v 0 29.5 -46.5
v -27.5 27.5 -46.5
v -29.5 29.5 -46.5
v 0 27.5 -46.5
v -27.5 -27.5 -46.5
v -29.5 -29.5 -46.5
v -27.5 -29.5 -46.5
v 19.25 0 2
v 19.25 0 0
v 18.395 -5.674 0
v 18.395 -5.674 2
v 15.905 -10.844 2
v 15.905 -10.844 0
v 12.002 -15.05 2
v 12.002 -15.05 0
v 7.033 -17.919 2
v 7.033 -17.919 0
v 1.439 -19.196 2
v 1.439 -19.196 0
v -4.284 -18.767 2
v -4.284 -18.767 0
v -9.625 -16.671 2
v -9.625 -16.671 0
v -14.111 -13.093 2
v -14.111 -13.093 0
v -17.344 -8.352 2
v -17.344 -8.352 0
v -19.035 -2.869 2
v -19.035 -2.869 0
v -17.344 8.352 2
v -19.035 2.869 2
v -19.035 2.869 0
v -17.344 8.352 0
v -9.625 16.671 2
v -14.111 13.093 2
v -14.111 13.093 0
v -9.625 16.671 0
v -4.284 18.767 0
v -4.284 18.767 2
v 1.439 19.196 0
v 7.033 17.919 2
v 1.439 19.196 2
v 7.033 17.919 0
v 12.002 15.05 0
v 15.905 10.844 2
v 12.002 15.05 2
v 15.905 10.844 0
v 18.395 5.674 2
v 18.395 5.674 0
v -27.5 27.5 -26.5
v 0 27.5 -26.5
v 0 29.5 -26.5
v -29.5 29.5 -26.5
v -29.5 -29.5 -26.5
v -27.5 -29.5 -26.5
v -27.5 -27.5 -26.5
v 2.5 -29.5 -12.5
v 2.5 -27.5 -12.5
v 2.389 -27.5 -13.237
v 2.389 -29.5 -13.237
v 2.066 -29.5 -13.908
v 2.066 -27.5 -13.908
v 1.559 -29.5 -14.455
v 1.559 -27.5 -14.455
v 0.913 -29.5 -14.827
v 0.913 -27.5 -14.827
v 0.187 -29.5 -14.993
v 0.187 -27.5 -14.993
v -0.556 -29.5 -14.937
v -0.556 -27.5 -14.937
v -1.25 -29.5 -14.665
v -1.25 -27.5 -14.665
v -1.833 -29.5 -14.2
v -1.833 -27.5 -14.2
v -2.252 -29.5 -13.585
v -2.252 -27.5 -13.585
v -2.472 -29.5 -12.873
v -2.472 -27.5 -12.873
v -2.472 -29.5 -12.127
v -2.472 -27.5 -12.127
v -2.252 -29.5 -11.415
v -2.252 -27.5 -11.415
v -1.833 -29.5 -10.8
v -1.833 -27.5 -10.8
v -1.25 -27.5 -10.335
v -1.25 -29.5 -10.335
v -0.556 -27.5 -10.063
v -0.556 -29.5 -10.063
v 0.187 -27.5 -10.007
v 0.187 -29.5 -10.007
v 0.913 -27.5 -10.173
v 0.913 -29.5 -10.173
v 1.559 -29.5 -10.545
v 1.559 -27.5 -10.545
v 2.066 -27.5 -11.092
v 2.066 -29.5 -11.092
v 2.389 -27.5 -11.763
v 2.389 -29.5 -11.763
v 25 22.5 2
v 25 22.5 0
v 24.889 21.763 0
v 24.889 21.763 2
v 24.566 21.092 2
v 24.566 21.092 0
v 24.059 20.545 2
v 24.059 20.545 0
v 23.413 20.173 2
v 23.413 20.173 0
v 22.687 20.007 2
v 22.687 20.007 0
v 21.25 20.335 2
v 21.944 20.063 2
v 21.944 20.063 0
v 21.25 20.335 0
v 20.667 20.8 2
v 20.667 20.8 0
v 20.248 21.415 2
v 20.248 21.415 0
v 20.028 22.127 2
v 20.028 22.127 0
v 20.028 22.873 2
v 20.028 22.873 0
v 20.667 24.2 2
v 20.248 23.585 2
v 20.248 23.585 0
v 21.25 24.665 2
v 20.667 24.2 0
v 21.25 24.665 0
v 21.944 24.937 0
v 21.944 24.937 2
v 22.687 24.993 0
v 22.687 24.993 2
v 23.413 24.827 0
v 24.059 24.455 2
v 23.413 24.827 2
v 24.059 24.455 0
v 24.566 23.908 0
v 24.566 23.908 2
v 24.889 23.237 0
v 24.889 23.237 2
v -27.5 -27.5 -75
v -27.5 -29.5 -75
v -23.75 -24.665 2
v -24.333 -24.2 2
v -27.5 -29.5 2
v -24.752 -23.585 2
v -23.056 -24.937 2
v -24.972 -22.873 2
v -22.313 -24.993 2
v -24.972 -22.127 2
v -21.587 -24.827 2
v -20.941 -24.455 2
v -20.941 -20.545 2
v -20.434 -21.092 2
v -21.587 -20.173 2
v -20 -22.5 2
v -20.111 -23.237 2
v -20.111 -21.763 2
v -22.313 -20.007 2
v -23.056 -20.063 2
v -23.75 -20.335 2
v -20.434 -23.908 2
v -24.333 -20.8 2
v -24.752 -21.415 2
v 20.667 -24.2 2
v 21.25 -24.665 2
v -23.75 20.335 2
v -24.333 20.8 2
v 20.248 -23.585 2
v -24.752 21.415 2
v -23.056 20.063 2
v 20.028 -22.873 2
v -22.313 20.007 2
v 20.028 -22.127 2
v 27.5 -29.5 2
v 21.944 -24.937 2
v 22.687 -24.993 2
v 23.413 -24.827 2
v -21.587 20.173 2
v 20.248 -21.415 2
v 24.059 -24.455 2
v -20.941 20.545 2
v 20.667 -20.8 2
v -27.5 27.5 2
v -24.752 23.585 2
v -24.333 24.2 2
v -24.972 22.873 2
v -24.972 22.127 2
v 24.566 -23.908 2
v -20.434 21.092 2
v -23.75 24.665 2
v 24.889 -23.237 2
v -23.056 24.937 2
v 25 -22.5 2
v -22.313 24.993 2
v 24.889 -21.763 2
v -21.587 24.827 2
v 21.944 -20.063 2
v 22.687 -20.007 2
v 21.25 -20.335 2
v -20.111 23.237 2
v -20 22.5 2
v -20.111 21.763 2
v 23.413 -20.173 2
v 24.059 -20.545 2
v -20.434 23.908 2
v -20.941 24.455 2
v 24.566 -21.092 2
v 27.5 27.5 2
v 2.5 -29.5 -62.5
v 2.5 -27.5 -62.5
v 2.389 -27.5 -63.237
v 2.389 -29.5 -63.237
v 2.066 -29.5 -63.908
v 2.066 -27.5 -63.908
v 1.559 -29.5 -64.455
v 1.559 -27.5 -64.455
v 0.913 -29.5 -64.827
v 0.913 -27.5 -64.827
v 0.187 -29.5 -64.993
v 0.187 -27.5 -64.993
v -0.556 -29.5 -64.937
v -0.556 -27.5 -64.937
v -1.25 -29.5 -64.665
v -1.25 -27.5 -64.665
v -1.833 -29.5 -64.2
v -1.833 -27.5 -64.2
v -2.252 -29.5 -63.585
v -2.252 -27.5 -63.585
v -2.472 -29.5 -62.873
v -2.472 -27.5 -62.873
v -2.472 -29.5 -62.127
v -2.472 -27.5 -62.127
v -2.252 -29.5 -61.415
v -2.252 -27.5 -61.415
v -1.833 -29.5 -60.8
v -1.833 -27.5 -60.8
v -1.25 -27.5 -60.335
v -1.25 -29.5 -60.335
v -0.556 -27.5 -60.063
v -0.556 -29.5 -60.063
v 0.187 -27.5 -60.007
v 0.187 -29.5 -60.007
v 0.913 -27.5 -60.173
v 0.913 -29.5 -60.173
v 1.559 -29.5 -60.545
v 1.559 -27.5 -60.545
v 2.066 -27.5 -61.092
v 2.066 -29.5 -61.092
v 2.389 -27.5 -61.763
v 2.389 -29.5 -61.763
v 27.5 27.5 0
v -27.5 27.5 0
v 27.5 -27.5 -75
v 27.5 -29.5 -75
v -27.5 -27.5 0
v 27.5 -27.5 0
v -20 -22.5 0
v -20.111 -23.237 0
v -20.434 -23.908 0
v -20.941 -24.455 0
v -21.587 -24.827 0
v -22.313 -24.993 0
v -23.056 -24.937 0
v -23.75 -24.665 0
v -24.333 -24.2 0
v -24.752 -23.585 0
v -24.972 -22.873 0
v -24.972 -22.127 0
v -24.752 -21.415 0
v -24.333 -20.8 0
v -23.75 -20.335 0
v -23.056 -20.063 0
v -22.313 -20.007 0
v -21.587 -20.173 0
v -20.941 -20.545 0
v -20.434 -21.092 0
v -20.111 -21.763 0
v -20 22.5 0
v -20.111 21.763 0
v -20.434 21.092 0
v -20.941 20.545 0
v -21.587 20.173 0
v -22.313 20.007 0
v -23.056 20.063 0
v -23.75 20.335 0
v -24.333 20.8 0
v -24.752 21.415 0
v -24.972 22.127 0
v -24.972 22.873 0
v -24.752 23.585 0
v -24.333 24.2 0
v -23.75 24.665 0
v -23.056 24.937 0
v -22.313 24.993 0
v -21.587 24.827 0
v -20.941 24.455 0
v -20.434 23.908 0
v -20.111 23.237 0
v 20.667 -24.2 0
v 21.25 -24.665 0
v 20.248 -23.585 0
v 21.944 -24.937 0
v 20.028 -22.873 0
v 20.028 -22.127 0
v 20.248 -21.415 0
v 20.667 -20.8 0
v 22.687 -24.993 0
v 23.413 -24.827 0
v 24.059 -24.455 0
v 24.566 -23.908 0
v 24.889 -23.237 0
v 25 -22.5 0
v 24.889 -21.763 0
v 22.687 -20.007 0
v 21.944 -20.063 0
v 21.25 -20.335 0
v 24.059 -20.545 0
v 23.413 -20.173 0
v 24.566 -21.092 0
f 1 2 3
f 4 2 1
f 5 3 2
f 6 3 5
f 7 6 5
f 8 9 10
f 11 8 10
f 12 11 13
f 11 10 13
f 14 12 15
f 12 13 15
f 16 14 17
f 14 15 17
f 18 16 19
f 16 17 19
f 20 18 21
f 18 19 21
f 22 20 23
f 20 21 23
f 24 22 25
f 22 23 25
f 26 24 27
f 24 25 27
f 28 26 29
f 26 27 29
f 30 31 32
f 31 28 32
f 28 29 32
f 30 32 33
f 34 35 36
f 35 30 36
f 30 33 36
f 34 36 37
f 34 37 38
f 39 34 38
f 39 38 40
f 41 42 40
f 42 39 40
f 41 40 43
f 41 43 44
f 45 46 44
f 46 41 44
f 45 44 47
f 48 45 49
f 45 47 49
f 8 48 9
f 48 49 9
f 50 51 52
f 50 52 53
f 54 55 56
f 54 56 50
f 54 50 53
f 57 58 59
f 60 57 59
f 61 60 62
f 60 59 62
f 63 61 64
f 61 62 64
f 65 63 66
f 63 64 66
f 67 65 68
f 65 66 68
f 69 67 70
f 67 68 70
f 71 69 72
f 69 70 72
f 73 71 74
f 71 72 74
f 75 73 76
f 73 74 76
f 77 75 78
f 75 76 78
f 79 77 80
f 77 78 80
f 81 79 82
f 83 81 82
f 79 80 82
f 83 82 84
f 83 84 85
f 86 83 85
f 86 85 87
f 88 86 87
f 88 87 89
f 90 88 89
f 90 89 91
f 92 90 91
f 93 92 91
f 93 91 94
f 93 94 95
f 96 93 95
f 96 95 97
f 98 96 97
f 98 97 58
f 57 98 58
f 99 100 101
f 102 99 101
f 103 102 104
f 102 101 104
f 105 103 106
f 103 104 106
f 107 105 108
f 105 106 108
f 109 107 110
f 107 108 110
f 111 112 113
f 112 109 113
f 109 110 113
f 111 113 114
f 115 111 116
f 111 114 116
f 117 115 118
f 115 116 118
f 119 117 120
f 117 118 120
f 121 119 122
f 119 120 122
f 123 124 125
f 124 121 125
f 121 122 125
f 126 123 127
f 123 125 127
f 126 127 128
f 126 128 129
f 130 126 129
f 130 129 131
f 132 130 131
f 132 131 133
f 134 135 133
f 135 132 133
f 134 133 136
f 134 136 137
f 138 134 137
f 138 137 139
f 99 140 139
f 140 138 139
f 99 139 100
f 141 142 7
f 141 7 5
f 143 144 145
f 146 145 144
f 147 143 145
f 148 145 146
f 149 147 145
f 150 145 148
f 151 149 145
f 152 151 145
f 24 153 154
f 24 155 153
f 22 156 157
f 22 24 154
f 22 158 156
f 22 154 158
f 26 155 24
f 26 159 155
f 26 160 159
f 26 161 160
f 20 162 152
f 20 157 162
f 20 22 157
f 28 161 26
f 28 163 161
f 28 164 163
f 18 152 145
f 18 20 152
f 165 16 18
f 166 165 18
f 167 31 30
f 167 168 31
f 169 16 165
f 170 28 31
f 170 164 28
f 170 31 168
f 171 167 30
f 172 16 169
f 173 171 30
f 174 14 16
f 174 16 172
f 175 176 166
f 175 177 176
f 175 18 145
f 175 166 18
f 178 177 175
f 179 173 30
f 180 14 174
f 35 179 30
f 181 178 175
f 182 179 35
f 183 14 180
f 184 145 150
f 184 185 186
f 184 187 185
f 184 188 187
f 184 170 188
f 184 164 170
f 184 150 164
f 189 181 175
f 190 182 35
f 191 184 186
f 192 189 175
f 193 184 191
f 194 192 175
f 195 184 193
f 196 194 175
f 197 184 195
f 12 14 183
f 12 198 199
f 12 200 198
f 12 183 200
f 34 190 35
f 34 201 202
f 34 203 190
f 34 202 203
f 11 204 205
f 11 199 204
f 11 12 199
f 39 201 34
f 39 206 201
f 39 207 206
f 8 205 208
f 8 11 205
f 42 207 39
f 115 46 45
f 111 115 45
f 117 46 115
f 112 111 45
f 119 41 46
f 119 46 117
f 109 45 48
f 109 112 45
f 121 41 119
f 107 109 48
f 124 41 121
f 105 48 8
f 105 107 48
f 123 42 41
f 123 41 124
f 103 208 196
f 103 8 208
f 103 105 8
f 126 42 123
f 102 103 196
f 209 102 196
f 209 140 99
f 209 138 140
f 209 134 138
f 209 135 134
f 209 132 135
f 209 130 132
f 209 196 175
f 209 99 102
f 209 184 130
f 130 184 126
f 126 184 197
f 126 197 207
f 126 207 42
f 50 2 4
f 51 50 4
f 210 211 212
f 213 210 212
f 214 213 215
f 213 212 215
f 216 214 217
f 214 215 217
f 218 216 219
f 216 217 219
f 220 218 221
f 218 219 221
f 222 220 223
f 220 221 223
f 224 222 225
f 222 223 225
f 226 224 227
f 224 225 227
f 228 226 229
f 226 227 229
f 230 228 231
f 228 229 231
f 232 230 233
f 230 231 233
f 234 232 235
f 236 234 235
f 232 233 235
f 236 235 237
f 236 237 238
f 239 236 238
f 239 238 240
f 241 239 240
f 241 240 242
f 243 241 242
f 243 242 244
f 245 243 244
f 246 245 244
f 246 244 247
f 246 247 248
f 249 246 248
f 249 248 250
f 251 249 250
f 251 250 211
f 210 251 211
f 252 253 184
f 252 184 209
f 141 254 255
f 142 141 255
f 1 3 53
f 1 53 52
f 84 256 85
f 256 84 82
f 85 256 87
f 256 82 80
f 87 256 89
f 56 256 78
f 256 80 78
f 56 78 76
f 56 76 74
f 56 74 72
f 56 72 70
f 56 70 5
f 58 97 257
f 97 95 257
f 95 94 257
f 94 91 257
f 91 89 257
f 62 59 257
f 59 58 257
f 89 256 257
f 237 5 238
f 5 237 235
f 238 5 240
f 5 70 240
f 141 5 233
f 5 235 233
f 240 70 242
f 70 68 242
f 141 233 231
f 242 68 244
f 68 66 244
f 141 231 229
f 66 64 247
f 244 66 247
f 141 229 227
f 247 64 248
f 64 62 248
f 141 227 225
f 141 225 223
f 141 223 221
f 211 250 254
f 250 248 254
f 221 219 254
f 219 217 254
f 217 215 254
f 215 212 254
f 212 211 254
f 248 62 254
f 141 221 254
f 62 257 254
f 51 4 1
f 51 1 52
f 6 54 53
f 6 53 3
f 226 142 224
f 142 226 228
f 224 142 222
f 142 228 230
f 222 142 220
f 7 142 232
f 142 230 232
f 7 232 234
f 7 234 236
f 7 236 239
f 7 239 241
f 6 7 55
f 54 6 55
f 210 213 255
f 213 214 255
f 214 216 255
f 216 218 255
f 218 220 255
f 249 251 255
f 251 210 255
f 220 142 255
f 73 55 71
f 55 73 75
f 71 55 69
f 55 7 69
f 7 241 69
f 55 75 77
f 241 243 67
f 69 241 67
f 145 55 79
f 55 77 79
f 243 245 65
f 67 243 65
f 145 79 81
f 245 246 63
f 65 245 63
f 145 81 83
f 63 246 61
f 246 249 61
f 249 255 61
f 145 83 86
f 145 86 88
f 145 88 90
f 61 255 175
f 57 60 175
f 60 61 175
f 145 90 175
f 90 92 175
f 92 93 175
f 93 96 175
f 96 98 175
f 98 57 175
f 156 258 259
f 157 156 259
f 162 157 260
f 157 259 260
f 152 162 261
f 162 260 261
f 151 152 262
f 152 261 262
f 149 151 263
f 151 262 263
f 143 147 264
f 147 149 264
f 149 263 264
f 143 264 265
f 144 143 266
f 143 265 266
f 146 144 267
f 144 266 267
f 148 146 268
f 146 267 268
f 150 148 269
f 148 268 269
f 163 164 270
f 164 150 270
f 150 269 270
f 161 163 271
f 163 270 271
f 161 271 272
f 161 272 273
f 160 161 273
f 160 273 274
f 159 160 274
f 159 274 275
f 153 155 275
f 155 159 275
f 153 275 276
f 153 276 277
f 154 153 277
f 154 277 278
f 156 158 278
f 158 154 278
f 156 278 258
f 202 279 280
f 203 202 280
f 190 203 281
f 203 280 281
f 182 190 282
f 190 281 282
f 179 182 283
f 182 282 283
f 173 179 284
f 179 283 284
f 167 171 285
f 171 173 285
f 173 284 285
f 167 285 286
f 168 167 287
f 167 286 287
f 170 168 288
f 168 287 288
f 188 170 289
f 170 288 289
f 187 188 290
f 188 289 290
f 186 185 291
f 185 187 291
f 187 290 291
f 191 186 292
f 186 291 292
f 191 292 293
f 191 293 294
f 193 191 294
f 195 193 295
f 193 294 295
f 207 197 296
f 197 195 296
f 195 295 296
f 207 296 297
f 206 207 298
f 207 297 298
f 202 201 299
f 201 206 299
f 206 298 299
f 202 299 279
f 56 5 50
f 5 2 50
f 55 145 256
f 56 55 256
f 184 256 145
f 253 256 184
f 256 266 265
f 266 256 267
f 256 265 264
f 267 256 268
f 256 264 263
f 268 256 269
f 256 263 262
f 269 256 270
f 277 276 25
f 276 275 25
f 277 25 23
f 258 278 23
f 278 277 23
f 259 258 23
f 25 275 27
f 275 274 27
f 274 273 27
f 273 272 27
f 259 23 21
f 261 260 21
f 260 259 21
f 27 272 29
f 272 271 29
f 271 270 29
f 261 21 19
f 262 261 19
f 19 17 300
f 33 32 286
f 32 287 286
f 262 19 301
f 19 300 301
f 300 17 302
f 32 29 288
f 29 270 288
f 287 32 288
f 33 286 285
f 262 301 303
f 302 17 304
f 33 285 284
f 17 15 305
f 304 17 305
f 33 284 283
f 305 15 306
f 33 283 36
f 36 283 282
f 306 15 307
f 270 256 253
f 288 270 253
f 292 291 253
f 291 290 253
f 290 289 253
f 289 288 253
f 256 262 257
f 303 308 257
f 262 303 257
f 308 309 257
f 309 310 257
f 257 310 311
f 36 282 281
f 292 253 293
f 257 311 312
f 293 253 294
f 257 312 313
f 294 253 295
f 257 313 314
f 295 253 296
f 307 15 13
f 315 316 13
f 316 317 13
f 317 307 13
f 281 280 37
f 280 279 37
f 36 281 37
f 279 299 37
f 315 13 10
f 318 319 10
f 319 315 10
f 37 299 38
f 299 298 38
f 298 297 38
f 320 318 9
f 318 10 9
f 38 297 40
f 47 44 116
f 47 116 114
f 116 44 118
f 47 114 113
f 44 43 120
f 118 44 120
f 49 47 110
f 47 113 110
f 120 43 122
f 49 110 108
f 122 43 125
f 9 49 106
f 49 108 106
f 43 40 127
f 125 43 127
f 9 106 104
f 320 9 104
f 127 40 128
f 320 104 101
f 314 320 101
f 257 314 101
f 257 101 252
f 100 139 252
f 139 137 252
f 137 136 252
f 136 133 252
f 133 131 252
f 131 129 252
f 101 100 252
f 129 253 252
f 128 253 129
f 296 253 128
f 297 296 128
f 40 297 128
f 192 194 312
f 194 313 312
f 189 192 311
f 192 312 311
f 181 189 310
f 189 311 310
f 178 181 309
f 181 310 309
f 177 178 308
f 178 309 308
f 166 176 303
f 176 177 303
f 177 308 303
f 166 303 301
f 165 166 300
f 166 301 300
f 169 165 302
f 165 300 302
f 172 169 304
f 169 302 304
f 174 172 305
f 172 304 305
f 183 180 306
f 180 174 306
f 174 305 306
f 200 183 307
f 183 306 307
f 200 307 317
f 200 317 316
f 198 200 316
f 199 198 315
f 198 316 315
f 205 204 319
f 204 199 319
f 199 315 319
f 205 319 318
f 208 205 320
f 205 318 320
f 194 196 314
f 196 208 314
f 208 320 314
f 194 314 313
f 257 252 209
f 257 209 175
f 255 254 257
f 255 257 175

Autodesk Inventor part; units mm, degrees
ref_plane "YZ Plane" through (0, 0, 0) normal (1, 0, 0) x (0, 1, 0)
ref_plane "XZ Plane" through (0, 0, 0) normal (0, 1, 0) x (-1, 0, 0)
ref_plane "XY Plane" through (0, 0, 0) normal (0, 0, 1) x (1, 0, 0)
sketch "Sketch1" plane through (0, 0, 0) normal (0, 0, 1) x (1, 0, 0)
  line L0 (-27.5, 27.5) -> (27.5, 27.5)
  line L1 (27.5, 27.5) -> (27.5, -27.5)
  line L2 (27.5, -27.5) -> (-27.5, -27.5)
  line L3 (-27.5, -27.5) -> (-27.5, 27.5)
  circle A0 centre (-22.5, 22.5) radius 2.5
  circle A1 centre (22.5, 22.5) radius 2.5
  circle A2 centre (-22.5, -22.5) radius 2.5
  circle A3 centre (22.5, -22.5) radius 2.5
  circle A4 centre (0, 0) radius 19.25
  dimension "d1" = 55
  dimension "d2" = 55
  dimension "d3" = 27.5
  dimension "d4" = 27.5
  dimension "d5" = 38.5
  dimension "d6" = 5
  dimension "d7" = 5
  dimension "d8" = 5
  dimension "d9" = 5
  dimension "d10" = 5
  dimension "d11" = 5
  dimension "d12" = 5
  dimension "d13" = 5
  dimension "d14" = 5
  dimension "d15" = 5
  dimension "d16" = 5
  dimension "d17" = 5
extrude "Extrusion1" add sketch "Sketch1" along normal blind 2
sketch "Sketch2" plane through (27.5, -27.5, 0) normal (1, 0, 0) x (0, 0, -1)
  line L0 (0, 0) -> (-2, 0) projected
  line L1 (0, 0) -> (75, 0)
  line L2 (75, 0) -> (75, -2)
  line L3 (75, -2) -> (-2, -2)
  line L4 (-2, -2) -> (-2, 0)
  point P0 (0, 27.5)
  dimension "d20" = 75
  dimension "d21" = 2
  dimension "d22" = 77
extrude "Extrusion2" add sketch "Sketch2" against normal blind 55
sketch "Sketch3" plane through (-27.5, -27.5, 0) normal (-1, 0, 0) x (0, 0, 1)
  line L0 (-75, -2) -> (2, -2) projected
  line L1 (-36.5, -2) -> (-36.5, 55)
  line L2 (0, 0) -> (-75, 0) projected
  line L3 (-36.5, 55) -> (-46.5, 55)
  line L4 (-46.5, 55) -> (-46.5, -2)
  line L5 (-46.5, -2) -> (-26.5, -2)
  line L6 (-26.5, -2) -> (-26.5, 55)
  line L7 (-26.5, 55) -> (-36.5, 55)
  point P0 (0, 27.5)
  dimension "d25" = 57
  dimension "d26" = 10
  dimension "d27" = 57
  dimension "d28" = 20
  dimension "d29" = 57
extrude "Extrusion3" add sketch "Sketch3" along normal blind 2
sketch "Sketch4" plane through (-27.5, 27.5, -26.5) normal (0, 1, 0) x (1, 0, 0)
  line L0 (-2, 0) -> (-2, 20) projected
  line L1 (-2, 20) -> (27.5, 20)
  line L2 (27.5, 20) -> (27.5, 0)
  line L3 (0, 0) -> (-2, 0) projected
  line L4 (27.5, 0) -> (-2, 0)
  line L5 (-2, 0) -> (-2, 20)
  point P0 (27.5, -26.5)
  dimension "d32" = 29.5
  dimension "d33" = 20
extrude "Extrusion4" add sketch "Sketch4" along normal blind 2
sketch "Sketch5" plane through (27.5, -27.5, 0) normal (0, 1, 0) x (1, 0, 0)
  line L0 (0, 75) -> (0, 0) projected
  line L1 (0, 37.5) -> (-27.5, 37.5)
  line L2 (-27.5, 37.5) -> (-27.5, 62.5)
  line L3 (-27.5, 26.5) -> (-27.5, 46.5) projected
  line L4 (-27.5, 37.5) -> (-27.5, 12.5)
  circle A0 centre (-27.5, 62.5) radius 2.5
  circle A1 centre (-27.5, 12.5) radius 2.5
  point P0 (-27.5, 0)
  dimension "d36" = 27.5
  dimension "d37" = 25
  dimension "d38" = 25
  dimension "d39" = 5
  dimension "d40" = 5
extrude "Extrusion5" cut sketch "Sketch5" against normal blind 2
equation "\"BendRadius\" = Thickness"
equation "\"BendReliefWidth\" = Thickness"
equation "\"BendReliefDepth\" = 0.5 * Thickness"
equation "\"CornerReliefSize\" = 4 * Thickness"
equation "\"MinimumRemnant\" = 2 * Thickness"
equation "\"TransitionRadius\" = BendRadius"
equation "\"JacobiRadiusSize\" = Thickness"
equation "\"GapSize\" = Thickness"
equation "\"Thickness\" = 0.5"
properties part number "MotorClamp"
